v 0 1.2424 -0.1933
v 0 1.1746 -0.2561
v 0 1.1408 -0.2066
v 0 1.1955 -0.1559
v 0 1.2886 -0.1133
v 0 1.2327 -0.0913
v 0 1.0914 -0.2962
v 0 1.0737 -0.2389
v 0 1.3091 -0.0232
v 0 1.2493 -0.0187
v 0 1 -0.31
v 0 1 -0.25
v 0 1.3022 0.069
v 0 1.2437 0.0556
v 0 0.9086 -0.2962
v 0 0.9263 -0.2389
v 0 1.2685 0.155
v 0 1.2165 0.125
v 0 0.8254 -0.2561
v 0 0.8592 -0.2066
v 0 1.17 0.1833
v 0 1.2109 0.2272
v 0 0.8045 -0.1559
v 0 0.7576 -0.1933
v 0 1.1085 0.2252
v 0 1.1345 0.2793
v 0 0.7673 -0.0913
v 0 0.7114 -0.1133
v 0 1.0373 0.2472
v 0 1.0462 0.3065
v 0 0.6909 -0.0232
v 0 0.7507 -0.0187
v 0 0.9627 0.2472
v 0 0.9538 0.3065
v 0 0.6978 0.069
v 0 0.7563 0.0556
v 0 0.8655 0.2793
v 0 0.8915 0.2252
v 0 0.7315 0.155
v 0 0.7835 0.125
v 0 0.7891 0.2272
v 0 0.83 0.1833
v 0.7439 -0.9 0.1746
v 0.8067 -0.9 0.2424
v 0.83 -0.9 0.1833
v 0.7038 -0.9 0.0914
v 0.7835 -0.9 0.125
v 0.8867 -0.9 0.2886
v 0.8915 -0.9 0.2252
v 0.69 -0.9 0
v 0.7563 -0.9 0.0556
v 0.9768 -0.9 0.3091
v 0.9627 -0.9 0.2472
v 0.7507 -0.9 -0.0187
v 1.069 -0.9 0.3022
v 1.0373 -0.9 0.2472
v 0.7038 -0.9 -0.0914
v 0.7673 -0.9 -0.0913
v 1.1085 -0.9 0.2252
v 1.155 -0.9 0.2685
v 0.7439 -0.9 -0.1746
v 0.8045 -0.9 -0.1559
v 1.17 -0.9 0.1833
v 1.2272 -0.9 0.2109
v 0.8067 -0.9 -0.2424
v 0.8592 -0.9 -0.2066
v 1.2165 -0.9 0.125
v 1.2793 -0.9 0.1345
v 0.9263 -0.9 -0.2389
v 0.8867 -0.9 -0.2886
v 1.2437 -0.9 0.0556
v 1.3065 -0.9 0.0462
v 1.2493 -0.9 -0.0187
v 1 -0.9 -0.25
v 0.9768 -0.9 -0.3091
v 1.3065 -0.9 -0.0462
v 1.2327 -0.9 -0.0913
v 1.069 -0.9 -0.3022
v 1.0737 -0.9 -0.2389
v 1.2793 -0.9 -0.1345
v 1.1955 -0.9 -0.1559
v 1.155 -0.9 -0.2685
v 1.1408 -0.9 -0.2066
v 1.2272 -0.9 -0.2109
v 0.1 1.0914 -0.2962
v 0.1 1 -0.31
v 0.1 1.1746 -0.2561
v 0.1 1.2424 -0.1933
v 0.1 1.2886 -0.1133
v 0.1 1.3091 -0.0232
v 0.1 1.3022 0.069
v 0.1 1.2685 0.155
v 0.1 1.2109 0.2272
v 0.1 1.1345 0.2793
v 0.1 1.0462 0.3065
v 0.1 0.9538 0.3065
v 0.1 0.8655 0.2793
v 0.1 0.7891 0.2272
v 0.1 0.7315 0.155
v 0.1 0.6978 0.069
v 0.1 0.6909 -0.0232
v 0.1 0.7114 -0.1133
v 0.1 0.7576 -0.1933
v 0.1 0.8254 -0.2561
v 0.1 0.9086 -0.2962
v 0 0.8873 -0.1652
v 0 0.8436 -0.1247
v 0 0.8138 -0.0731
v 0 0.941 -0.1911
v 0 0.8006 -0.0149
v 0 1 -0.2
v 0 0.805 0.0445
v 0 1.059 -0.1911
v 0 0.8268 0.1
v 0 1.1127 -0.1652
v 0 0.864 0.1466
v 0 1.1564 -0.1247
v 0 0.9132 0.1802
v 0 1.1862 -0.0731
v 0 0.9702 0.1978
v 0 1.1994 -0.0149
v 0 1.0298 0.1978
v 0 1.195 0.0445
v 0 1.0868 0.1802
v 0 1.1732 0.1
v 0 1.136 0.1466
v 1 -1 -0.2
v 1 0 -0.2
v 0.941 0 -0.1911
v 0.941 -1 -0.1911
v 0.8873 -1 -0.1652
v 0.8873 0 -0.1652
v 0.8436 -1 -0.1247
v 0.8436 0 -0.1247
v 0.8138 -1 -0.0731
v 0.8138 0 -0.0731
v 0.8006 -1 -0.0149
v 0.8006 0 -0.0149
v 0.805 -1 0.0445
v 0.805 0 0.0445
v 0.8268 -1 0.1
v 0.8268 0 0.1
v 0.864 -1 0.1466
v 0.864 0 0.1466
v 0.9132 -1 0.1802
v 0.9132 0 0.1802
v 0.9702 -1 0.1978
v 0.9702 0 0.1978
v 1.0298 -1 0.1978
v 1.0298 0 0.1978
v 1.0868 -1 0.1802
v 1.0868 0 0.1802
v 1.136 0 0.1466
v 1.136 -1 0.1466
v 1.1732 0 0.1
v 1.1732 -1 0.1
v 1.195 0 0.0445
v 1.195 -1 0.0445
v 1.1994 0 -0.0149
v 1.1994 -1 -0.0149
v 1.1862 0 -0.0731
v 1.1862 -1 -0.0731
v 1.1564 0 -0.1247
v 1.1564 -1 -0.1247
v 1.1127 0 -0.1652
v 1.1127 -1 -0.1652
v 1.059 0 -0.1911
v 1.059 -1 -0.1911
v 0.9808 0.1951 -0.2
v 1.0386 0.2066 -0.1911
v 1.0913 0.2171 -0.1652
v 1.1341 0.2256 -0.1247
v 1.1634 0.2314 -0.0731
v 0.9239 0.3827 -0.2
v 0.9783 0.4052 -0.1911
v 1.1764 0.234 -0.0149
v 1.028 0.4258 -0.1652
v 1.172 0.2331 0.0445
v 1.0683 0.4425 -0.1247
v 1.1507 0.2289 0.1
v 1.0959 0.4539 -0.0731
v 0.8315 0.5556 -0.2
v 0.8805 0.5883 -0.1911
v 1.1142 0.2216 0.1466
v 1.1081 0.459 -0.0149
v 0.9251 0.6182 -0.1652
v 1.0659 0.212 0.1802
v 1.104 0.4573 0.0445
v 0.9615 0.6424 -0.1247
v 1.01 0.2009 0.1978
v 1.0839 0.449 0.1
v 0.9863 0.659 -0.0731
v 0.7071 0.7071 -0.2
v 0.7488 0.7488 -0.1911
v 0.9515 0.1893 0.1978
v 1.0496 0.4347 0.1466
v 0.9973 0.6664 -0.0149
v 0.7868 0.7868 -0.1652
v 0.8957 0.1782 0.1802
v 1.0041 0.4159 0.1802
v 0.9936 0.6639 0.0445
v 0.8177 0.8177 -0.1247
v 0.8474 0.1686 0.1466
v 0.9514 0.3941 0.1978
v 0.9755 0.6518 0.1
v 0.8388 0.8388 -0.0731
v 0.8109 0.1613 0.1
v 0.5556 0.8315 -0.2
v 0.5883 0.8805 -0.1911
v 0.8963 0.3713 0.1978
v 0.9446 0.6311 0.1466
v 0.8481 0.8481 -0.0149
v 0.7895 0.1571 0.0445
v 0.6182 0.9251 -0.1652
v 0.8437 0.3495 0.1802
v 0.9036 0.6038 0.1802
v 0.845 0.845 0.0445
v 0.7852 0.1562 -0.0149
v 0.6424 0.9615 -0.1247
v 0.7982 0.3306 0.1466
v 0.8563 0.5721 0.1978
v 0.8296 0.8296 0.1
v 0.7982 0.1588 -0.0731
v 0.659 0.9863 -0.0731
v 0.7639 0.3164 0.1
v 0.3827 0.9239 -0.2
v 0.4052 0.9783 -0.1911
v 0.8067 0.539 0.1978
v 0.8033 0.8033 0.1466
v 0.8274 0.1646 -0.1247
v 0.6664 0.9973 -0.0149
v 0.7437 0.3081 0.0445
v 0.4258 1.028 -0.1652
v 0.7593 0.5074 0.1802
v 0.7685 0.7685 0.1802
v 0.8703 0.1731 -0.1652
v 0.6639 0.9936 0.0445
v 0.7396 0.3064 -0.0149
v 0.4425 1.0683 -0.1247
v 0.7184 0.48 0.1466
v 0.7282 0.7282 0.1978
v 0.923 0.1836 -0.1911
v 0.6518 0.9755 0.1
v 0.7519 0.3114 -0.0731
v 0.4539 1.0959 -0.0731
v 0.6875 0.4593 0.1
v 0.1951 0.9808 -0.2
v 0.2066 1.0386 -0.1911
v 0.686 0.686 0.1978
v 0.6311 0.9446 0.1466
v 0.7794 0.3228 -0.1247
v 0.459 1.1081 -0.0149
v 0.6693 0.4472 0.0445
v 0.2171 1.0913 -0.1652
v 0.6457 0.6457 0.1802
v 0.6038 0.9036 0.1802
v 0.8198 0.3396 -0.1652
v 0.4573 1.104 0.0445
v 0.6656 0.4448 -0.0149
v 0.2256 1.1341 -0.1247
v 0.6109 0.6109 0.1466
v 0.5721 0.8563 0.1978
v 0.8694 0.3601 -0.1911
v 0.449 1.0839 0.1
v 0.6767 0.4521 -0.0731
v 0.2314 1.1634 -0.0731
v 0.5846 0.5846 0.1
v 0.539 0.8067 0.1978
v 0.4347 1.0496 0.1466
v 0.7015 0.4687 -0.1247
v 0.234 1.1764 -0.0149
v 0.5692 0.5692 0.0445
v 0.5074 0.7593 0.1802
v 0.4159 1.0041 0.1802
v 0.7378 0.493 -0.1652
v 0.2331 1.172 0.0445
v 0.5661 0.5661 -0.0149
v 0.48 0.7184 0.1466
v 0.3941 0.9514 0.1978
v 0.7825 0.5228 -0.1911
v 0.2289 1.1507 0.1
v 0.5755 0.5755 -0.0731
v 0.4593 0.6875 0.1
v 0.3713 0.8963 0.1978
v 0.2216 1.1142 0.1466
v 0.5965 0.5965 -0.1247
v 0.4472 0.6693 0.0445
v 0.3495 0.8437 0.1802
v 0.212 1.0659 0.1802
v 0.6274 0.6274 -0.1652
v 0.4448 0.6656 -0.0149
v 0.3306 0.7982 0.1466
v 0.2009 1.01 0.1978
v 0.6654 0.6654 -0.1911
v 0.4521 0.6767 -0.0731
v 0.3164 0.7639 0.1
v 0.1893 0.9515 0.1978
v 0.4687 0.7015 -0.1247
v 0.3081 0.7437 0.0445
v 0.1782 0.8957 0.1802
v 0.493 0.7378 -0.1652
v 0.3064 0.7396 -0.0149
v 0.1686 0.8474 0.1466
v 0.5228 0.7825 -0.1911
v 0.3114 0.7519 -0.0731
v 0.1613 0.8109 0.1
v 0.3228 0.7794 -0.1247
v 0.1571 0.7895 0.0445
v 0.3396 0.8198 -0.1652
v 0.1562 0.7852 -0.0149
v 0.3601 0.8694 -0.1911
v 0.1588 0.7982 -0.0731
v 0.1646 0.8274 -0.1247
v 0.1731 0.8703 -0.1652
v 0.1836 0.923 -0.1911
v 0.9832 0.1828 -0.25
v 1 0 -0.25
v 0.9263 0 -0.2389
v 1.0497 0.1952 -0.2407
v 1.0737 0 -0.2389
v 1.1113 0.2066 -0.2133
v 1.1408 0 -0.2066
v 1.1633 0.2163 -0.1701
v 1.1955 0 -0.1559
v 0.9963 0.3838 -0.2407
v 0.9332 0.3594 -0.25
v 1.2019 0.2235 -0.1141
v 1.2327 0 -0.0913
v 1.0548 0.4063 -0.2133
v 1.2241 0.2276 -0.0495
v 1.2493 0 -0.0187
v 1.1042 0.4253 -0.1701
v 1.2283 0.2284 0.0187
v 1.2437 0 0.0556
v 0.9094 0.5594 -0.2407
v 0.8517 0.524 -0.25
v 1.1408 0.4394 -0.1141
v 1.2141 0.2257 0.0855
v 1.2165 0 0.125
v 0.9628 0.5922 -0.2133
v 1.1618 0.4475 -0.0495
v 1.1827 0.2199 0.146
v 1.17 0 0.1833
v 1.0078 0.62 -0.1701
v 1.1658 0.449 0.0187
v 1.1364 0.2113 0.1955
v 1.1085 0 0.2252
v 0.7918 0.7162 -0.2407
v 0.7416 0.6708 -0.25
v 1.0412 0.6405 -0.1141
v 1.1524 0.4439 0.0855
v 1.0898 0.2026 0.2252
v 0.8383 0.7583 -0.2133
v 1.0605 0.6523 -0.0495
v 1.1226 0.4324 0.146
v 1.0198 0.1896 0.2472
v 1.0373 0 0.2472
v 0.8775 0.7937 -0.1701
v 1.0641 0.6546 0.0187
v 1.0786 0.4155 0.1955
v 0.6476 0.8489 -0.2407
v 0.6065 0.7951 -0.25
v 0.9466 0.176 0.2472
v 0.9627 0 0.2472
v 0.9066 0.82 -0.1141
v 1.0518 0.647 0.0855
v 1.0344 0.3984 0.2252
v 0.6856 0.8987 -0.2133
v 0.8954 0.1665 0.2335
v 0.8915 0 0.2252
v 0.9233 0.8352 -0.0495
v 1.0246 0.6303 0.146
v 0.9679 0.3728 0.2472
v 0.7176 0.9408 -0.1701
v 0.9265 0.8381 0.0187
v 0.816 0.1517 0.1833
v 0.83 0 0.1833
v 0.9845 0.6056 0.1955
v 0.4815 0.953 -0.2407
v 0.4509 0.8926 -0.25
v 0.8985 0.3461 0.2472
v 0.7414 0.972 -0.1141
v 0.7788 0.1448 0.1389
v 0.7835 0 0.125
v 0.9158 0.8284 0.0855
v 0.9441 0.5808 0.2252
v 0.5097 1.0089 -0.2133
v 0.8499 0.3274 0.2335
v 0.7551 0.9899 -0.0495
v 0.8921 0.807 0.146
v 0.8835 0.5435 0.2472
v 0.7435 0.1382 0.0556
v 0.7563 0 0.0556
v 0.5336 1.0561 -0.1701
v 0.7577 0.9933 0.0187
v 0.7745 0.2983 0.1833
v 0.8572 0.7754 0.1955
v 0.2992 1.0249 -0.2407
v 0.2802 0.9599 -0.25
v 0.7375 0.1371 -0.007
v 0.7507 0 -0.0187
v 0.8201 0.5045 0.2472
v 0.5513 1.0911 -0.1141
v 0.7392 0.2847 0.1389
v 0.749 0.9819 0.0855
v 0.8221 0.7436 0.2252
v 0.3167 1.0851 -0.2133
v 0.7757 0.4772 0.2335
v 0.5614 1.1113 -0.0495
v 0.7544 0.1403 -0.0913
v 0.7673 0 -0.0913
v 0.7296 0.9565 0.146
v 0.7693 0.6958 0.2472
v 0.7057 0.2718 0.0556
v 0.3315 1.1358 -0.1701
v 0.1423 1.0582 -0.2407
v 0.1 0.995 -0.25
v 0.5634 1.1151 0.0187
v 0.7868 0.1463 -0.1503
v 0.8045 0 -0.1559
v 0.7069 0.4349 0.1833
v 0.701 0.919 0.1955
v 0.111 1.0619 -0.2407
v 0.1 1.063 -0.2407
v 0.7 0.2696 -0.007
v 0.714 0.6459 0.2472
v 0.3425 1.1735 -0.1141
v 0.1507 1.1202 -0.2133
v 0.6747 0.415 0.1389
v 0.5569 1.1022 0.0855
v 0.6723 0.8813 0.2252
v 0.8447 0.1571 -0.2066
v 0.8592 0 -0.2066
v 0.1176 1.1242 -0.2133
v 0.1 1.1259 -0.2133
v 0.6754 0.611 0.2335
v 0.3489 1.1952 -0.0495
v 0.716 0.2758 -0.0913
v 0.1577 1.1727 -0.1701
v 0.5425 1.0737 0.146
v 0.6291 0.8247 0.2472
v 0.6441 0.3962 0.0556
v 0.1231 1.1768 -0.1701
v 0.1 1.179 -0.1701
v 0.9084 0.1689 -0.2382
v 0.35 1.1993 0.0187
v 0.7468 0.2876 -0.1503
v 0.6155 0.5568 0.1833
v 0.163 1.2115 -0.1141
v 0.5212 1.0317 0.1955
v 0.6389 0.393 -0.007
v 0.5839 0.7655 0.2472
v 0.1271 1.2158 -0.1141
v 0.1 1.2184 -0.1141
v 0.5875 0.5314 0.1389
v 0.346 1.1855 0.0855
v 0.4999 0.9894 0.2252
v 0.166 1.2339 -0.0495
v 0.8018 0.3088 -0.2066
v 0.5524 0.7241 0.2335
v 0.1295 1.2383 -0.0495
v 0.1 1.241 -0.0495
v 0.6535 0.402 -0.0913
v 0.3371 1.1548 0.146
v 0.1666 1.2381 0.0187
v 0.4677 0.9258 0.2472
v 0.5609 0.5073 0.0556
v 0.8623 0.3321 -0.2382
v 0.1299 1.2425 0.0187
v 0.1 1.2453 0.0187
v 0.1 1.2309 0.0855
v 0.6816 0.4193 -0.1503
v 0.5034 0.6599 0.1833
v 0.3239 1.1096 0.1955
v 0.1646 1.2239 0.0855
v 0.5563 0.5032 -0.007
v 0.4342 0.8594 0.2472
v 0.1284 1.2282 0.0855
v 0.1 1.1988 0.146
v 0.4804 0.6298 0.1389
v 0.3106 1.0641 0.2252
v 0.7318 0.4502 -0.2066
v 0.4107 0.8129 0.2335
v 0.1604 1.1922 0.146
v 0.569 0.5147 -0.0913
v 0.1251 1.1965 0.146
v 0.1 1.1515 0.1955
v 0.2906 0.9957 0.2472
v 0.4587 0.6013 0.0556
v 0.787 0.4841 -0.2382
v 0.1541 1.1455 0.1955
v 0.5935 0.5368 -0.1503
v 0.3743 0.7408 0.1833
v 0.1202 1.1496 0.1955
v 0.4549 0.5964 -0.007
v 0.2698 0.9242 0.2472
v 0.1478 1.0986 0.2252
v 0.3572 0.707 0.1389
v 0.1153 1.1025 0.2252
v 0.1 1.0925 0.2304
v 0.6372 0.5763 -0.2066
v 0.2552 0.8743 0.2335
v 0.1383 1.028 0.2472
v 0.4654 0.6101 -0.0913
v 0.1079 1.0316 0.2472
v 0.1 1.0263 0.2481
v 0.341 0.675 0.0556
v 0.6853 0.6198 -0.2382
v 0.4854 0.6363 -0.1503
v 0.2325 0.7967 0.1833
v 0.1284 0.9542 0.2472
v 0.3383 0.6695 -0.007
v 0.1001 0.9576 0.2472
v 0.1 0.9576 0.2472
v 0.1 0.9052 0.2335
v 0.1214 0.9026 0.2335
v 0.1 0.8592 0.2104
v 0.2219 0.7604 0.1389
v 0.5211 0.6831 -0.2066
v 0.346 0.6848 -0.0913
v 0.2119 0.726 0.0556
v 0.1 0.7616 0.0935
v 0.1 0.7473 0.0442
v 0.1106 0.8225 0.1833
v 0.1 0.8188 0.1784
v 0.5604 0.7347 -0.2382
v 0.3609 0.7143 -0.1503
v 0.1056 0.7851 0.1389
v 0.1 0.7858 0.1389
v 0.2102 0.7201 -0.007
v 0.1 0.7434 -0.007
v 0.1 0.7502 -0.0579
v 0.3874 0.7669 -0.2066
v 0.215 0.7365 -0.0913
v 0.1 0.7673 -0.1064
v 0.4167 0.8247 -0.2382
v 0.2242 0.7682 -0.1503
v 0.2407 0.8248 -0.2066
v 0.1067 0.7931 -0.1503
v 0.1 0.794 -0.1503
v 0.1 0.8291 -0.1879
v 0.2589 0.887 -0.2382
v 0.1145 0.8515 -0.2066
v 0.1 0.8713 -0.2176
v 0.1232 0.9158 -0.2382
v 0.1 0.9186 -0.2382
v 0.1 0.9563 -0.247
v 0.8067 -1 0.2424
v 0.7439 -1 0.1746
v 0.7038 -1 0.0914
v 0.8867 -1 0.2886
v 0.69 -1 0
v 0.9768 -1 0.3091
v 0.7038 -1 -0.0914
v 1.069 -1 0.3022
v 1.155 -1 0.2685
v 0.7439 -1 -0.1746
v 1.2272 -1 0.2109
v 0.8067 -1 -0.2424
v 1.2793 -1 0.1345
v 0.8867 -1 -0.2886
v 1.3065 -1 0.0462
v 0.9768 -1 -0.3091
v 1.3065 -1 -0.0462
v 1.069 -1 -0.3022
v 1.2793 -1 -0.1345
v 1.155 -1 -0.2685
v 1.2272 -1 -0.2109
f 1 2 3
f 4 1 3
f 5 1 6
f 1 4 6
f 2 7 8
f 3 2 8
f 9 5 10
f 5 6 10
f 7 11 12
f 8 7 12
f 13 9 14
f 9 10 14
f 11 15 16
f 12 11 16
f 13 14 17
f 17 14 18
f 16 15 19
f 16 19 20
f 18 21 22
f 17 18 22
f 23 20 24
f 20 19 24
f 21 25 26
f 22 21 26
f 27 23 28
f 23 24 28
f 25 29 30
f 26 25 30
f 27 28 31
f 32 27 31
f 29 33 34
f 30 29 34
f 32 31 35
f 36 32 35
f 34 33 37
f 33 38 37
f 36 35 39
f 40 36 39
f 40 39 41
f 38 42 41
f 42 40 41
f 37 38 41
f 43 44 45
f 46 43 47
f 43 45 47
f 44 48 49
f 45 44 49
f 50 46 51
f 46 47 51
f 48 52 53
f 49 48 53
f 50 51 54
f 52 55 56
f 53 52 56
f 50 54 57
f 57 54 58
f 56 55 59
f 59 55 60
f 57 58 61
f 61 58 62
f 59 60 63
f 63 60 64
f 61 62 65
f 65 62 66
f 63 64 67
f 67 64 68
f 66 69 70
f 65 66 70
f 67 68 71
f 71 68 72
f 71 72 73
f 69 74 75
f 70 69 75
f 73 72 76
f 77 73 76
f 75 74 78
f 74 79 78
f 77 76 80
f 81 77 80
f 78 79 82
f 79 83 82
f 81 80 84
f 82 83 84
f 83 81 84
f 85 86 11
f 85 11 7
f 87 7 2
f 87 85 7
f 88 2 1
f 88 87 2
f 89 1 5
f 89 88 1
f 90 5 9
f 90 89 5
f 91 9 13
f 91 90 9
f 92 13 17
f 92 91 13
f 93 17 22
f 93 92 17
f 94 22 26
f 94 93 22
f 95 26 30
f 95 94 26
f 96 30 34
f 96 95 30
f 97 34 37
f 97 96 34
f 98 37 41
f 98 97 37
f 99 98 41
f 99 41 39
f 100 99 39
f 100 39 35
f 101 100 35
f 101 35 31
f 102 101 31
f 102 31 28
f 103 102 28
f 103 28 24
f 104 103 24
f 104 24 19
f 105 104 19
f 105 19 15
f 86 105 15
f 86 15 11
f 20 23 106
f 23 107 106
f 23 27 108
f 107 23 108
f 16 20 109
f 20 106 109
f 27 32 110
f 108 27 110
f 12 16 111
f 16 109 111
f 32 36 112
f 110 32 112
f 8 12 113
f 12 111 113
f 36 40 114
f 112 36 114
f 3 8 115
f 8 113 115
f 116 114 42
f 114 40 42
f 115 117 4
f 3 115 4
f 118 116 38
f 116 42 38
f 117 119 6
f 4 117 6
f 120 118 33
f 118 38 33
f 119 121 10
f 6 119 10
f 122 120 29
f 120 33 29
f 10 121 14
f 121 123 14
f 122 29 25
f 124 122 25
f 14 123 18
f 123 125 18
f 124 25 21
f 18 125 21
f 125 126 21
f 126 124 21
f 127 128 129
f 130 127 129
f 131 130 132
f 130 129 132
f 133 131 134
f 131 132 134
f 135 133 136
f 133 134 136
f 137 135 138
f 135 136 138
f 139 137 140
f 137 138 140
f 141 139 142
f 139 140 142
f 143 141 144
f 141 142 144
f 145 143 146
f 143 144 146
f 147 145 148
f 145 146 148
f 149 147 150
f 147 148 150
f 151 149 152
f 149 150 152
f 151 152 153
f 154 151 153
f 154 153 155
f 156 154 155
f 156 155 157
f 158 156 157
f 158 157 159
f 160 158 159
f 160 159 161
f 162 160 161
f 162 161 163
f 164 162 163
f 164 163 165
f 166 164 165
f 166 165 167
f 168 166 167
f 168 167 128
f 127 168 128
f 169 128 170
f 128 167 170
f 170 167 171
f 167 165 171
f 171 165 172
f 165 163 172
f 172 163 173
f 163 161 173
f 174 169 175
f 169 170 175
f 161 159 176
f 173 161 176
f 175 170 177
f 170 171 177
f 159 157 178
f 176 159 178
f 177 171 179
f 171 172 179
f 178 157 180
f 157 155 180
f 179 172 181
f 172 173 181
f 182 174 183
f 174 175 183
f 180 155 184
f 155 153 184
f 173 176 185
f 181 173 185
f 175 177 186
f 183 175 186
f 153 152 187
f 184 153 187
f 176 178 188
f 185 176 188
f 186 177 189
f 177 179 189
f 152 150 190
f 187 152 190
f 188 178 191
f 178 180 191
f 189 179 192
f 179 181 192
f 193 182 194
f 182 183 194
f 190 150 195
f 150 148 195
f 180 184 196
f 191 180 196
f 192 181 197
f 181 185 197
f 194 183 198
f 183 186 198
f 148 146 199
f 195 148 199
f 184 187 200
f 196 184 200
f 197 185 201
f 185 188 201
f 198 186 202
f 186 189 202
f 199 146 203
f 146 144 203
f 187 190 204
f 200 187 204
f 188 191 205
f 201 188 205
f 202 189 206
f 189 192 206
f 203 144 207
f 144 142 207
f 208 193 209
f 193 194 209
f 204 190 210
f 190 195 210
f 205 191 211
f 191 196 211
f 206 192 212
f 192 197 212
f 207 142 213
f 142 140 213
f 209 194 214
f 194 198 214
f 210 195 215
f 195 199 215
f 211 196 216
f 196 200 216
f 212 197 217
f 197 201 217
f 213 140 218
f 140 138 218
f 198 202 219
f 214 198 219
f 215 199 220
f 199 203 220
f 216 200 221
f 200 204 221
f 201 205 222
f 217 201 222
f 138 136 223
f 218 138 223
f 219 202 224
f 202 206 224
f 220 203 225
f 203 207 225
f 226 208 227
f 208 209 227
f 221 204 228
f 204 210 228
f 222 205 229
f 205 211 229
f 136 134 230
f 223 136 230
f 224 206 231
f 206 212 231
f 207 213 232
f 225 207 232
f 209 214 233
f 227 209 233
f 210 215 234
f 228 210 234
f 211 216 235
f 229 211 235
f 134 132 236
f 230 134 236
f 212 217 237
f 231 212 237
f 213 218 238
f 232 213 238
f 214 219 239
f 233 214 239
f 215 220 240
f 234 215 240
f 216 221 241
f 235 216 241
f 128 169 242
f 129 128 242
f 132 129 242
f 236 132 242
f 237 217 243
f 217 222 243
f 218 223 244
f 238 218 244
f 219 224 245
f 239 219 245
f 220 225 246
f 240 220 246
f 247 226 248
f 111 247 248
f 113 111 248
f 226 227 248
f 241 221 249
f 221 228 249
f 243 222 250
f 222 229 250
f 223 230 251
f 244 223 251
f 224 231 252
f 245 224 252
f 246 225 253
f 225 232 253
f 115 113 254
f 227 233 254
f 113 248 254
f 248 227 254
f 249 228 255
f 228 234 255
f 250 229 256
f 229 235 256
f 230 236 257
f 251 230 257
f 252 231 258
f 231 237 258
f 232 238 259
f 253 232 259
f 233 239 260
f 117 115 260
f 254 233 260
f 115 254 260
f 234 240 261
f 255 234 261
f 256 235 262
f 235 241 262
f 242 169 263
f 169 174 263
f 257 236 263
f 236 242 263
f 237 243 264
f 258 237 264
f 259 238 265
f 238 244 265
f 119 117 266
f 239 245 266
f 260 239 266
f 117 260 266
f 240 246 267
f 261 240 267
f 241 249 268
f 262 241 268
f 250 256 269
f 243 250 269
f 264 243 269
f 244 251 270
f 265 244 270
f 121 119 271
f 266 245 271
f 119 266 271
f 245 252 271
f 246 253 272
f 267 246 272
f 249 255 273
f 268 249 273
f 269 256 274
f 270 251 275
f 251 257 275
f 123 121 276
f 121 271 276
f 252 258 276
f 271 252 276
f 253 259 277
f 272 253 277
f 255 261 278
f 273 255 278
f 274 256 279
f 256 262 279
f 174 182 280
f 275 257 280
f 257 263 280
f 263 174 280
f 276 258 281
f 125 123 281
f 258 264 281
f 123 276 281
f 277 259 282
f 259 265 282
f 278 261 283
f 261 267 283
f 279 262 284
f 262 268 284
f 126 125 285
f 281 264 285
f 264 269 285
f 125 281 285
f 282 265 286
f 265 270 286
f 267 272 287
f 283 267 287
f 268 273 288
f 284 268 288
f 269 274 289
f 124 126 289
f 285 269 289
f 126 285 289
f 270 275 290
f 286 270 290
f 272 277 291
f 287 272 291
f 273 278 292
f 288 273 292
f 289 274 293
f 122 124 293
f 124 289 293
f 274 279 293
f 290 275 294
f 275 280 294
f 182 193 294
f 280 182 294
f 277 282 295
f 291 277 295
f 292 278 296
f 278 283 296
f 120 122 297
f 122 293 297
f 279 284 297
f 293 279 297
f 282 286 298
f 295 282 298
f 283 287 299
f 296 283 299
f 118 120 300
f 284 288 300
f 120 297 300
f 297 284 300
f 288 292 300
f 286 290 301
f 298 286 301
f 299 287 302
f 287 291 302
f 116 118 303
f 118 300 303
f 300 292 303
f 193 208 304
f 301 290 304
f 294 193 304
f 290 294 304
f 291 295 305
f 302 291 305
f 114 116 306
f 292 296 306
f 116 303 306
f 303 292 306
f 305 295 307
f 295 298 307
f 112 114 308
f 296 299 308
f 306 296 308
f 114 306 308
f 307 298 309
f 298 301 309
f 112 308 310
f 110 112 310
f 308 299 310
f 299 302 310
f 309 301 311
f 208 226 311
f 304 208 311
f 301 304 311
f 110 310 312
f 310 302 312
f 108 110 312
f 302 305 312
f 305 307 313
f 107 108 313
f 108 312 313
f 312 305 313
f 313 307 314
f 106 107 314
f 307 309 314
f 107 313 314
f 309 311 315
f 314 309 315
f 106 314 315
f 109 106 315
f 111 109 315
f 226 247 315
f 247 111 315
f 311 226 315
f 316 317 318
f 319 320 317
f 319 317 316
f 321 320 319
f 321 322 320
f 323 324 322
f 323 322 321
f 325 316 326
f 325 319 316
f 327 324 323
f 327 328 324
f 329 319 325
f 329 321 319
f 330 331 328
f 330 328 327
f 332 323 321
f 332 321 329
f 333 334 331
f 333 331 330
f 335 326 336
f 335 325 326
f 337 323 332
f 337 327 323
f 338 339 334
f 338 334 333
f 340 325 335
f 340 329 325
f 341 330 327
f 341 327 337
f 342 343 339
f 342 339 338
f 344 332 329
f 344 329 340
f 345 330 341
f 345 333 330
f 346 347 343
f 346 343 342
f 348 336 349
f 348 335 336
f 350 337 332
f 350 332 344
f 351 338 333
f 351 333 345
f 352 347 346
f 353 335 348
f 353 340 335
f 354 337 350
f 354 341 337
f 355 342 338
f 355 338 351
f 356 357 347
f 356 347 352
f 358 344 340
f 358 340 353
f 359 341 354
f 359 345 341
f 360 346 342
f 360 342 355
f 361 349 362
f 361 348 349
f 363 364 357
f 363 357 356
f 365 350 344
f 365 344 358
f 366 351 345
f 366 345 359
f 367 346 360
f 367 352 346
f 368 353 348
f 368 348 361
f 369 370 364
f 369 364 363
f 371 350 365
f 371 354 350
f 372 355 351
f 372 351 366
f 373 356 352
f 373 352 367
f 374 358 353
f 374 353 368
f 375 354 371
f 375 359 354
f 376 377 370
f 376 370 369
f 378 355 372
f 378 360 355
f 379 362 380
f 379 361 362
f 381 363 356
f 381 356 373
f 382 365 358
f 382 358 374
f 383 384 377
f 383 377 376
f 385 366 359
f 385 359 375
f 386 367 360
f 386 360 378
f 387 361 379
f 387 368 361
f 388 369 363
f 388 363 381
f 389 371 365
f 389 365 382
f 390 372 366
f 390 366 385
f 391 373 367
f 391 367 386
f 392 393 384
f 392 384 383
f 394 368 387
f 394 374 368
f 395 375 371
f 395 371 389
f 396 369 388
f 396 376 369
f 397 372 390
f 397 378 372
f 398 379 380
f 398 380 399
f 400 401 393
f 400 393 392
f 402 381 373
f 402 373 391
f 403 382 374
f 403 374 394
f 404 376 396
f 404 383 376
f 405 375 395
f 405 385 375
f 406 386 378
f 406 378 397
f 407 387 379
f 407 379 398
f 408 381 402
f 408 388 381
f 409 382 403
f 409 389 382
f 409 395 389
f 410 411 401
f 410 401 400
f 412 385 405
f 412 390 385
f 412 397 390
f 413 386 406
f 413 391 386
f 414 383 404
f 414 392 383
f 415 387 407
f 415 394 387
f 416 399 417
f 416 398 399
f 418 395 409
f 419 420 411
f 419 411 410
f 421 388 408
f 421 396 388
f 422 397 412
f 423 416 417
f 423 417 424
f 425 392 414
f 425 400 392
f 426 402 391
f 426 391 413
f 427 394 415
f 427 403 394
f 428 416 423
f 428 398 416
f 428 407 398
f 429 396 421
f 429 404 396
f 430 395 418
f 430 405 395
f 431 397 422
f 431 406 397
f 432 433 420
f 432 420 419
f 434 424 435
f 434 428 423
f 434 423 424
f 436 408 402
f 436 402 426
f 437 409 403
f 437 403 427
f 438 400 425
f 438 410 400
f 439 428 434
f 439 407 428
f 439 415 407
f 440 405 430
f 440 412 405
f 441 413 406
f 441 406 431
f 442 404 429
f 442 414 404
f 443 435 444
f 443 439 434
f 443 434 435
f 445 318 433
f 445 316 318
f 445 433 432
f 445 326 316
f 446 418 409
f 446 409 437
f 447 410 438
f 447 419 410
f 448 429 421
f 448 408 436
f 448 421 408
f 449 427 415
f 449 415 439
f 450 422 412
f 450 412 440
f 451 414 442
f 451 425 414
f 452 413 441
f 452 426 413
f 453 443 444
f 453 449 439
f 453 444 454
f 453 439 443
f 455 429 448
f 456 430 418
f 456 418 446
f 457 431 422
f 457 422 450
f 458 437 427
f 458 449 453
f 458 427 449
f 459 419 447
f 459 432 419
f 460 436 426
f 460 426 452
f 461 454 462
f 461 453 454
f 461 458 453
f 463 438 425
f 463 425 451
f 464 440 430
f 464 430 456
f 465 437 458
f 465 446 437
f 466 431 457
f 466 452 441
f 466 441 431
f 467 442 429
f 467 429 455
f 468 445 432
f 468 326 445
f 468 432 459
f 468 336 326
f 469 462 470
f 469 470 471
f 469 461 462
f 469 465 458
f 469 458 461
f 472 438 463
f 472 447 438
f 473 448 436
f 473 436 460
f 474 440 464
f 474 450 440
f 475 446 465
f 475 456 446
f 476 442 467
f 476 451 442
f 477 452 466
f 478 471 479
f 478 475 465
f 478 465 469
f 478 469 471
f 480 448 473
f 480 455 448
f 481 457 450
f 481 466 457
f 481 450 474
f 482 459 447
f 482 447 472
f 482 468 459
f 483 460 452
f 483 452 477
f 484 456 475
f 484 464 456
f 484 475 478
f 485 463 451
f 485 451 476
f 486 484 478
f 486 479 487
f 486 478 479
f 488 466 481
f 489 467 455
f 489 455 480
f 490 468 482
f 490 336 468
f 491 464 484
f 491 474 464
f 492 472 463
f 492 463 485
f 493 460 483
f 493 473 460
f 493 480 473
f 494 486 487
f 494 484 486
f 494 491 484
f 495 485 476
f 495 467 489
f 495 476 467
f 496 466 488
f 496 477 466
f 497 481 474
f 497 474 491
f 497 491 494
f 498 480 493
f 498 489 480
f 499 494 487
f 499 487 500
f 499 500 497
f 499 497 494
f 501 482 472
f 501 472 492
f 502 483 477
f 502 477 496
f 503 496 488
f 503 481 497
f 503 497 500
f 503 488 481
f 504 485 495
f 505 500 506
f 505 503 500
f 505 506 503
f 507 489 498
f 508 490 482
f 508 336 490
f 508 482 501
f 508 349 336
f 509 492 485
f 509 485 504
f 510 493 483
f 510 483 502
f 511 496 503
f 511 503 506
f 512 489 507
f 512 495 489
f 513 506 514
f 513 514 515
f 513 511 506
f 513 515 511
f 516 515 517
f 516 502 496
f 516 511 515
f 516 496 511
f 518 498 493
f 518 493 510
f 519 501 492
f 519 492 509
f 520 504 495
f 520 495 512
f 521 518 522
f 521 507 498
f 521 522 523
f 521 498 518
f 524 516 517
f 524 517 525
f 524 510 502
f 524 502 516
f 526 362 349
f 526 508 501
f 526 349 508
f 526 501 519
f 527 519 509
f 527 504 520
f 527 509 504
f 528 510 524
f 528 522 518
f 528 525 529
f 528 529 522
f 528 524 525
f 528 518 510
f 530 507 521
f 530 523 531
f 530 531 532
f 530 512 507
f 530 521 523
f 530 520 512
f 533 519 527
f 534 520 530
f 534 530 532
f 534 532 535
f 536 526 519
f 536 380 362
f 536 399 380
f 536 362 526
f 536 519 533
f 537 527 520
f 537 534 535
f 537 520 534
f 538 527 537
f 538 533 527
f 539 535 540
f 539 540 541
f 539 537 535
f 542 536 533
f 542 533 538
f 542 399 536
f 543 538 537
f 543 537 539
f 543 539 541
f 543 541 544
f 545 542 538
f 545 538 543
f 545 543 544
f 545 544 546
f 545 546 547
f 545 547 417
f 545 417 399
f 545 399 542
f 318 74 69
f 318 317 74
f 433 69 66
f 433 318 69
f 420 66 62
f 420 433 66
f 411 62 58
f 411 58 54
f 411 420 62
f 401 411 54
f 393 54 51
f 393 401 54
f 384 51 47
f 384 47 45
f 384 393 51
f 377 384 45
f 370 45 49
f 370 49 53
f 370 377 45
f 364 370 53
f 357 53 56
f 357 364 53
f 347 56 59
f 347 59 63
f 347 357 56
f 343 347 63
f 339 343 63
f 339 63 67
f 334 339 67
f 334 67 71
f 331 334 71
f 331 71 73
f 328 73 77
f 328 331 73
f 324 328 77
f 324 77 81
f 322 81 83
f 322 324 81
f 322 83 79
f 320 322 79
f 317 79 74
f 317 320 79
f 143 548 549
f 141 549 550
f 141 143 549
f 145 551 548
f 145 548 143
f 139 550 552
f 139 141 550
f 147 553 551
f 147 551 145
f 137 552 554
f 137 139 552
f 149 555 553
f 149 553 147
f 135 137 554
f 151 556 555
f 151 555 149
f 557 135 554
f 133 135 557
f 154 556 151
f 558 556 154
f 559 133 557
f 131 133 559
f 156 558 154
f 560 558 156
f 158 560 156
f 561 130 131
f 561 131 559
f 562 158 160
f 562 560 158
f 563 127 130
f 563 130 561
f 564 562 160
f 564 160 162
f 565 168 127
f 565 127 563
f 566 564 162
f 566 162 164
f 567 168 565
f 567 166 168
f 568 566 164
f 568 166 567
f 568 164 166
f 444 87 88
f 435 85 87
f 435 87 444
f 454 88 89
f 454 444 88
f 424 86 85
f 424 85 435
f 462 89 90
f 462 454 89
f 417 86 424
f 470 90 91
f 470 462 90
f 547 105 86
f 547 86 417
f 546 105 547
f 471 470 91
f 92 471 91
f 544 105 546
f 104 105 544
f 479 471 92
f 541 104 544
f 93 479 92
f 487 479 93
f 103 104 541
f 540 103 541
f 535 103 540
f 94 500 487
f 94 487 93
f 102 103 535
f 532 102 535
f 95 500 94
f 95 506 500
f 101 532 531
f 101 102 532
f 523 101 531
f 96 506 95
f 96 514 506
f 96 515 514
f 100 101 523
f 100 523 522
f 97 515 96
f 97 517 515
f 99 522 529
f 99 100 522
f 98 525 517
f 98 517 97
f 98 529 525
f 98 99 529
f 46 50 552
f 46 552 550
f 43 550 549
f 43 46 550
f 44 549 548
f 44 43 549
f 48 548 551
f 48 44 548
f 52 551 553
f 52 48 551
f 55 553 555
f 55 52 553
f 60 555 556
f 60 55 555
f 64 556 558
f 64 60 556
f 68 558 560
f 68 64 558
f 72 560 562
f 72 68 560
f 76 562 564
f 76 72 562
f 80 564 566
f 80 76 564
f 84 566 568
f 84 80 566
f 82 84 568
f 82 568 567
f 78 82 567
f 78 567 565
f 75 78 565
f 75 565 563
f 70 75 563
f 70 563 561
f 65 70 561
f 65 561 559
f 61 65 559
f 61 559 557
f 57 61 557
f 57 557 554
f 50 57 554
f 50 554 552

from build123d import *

# Parameters (mm, degrees)
IZIM3_R   = 0.25
IZIM3_R_2 = 0.2
IZIM4_R   = 0.31
IZIM4_R_2 = 0.21
IZIM5_R   = 0.31
IZIM5_R_2 = 0.21


with BuildPart() as part:
    # Süpür-İnce1: sweep along a path in Çizim1
    with BuildLine(Plane.XY) as s_p_r_nce1_path:
        Line((1, -1), (1, 0))
        ThreePointArc((1, 0), (0.707106781, 0.707106781), (0, 1))
    # Çizim3 → Süpür-İnce1 (sweep)
    with BuildSketch(Plane(origin=(0, 0, 0), x_dir=(0, 0, -1), z_dir=(1, 0, 0))):
        with Locations((0, 1)):
            Circle(IZIM3_R)
        with Locations((0, 1)):
            Circle(IZIM3_R_2, mode=Mode.SUBTRACT)
    sweep(path=s_p_r_nce1_path.line)

    # Süpür-İnce2: sweep along a path in Çizim7
    with BuildLine(Plane.XY) as s_p_r_nce2_path:
        Line((0, 1), (0.1, 1))
    # Çizim4 → Süpür-İnce2 (sweep)
    with BuildSketch(Plane(origin=(0, 0, 0), x_dir=(0, 0, -1), z_dir=(1, 0, 0))):
        with Locations((0, 1)):
            Circle(IZIM4_R)
        with Locations((0, 1)):
            Circle(IZIM4_R_2, mode=Mode.SUBTRACT)
    sweep(path=s_p_r_nce2_path.line)

    # Süpür-İnce3: sweep along a path in Çizim6
    with BuildLine(Plane.XY) as s_p_r_nce3_path:
        Line((1, -1), (1, -0.9))
    # Çizim5 → Süpür-İnce3 (sweep)
    with BuildSketch(Plane(origin=(0, -1, 0), x_dir=(-1, 0, 0), z_dir=(0, -1, 0))):
        with Locations((-1, 0)):
            Circle(IZIM5_R)
        with Locations((-1, 0)):
            Circle(IZIM5_R_2, mode=Mode.SUBTRACT)
    sweep(path=s_p_r_nce3_path.line)


solid = part.part
